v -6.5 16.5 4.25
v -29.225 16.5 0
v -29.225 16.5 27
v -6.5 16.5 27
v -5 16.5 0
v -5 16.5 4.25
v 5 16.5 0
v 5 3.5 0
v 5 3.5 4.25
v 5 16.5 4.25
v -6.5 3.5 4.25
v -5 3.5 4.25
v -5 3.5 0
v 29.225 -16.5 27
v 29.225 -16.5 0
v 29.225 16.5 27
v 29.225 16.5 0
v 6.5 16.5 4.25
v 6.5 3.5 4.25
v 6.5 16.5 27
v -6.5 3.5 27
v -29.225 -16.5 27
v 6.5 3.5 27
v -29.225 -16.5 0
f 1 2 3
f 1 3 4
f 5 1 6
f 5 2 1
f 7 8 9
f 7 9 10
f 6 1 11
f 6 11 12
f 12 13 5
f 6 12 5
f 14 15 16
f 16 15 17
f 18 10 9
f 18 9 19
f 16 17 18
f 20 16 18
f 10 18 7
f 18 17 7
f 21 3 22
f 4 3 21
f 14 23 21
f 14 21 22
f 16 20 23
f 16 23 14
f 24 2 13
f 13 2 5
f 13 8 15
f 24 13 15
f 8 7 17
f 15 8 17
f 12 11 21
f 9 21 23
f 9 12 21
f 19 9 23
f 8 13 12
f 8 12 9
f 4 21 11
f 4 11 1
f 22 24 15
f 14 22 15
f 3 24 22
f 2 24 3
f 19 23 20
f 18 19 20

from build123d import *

# Parameters (mm, degrees)
F0_W     = 18.975
F0_H     = 33
F0_W_2   = 20.5
F1_DEPTH = 27
F2_W     = 13
F2_H     = 13
F3_DEPTH = 27.001
F4_W     = 1.5
F4_H     = 13
F5_DEPTH = 4.25


with BuildPart() as f1:
    # F0 (on Top) → F1 (new body)
    with BuildSketch(Plane.XY):
        with Locations((19.7375, 0)):
            Rectangle(F0_W, F0_H)
        Rectangle(F0_W_2, F0_H)
        with Locations((-19.7375, 0)):
            Rectangle(F0_W, F0_H)
    extrude(amount=F1_DEPTH)

    # F2 (on face) → F3 (cut, through all)
    with BuildSketch(Plane.XY):
        with Locations((0, 10)):
            Rectangle(F2_W, F2_H)
    extrude(amount=F3_DEPTH, mode=Mode.SUBTRACT)

    # F4 (on face) → F5 (join)
    with BuildSketch(Plane.XY):
        with Locations((-5.75, 10)):
            Rectangle(F4_W, F4_H)
        with Locations((5.75, 10)):
            Rectangle(F4_W, F4_H)
    extrude(amount=F5_DEPTH)


solid = f1.part
